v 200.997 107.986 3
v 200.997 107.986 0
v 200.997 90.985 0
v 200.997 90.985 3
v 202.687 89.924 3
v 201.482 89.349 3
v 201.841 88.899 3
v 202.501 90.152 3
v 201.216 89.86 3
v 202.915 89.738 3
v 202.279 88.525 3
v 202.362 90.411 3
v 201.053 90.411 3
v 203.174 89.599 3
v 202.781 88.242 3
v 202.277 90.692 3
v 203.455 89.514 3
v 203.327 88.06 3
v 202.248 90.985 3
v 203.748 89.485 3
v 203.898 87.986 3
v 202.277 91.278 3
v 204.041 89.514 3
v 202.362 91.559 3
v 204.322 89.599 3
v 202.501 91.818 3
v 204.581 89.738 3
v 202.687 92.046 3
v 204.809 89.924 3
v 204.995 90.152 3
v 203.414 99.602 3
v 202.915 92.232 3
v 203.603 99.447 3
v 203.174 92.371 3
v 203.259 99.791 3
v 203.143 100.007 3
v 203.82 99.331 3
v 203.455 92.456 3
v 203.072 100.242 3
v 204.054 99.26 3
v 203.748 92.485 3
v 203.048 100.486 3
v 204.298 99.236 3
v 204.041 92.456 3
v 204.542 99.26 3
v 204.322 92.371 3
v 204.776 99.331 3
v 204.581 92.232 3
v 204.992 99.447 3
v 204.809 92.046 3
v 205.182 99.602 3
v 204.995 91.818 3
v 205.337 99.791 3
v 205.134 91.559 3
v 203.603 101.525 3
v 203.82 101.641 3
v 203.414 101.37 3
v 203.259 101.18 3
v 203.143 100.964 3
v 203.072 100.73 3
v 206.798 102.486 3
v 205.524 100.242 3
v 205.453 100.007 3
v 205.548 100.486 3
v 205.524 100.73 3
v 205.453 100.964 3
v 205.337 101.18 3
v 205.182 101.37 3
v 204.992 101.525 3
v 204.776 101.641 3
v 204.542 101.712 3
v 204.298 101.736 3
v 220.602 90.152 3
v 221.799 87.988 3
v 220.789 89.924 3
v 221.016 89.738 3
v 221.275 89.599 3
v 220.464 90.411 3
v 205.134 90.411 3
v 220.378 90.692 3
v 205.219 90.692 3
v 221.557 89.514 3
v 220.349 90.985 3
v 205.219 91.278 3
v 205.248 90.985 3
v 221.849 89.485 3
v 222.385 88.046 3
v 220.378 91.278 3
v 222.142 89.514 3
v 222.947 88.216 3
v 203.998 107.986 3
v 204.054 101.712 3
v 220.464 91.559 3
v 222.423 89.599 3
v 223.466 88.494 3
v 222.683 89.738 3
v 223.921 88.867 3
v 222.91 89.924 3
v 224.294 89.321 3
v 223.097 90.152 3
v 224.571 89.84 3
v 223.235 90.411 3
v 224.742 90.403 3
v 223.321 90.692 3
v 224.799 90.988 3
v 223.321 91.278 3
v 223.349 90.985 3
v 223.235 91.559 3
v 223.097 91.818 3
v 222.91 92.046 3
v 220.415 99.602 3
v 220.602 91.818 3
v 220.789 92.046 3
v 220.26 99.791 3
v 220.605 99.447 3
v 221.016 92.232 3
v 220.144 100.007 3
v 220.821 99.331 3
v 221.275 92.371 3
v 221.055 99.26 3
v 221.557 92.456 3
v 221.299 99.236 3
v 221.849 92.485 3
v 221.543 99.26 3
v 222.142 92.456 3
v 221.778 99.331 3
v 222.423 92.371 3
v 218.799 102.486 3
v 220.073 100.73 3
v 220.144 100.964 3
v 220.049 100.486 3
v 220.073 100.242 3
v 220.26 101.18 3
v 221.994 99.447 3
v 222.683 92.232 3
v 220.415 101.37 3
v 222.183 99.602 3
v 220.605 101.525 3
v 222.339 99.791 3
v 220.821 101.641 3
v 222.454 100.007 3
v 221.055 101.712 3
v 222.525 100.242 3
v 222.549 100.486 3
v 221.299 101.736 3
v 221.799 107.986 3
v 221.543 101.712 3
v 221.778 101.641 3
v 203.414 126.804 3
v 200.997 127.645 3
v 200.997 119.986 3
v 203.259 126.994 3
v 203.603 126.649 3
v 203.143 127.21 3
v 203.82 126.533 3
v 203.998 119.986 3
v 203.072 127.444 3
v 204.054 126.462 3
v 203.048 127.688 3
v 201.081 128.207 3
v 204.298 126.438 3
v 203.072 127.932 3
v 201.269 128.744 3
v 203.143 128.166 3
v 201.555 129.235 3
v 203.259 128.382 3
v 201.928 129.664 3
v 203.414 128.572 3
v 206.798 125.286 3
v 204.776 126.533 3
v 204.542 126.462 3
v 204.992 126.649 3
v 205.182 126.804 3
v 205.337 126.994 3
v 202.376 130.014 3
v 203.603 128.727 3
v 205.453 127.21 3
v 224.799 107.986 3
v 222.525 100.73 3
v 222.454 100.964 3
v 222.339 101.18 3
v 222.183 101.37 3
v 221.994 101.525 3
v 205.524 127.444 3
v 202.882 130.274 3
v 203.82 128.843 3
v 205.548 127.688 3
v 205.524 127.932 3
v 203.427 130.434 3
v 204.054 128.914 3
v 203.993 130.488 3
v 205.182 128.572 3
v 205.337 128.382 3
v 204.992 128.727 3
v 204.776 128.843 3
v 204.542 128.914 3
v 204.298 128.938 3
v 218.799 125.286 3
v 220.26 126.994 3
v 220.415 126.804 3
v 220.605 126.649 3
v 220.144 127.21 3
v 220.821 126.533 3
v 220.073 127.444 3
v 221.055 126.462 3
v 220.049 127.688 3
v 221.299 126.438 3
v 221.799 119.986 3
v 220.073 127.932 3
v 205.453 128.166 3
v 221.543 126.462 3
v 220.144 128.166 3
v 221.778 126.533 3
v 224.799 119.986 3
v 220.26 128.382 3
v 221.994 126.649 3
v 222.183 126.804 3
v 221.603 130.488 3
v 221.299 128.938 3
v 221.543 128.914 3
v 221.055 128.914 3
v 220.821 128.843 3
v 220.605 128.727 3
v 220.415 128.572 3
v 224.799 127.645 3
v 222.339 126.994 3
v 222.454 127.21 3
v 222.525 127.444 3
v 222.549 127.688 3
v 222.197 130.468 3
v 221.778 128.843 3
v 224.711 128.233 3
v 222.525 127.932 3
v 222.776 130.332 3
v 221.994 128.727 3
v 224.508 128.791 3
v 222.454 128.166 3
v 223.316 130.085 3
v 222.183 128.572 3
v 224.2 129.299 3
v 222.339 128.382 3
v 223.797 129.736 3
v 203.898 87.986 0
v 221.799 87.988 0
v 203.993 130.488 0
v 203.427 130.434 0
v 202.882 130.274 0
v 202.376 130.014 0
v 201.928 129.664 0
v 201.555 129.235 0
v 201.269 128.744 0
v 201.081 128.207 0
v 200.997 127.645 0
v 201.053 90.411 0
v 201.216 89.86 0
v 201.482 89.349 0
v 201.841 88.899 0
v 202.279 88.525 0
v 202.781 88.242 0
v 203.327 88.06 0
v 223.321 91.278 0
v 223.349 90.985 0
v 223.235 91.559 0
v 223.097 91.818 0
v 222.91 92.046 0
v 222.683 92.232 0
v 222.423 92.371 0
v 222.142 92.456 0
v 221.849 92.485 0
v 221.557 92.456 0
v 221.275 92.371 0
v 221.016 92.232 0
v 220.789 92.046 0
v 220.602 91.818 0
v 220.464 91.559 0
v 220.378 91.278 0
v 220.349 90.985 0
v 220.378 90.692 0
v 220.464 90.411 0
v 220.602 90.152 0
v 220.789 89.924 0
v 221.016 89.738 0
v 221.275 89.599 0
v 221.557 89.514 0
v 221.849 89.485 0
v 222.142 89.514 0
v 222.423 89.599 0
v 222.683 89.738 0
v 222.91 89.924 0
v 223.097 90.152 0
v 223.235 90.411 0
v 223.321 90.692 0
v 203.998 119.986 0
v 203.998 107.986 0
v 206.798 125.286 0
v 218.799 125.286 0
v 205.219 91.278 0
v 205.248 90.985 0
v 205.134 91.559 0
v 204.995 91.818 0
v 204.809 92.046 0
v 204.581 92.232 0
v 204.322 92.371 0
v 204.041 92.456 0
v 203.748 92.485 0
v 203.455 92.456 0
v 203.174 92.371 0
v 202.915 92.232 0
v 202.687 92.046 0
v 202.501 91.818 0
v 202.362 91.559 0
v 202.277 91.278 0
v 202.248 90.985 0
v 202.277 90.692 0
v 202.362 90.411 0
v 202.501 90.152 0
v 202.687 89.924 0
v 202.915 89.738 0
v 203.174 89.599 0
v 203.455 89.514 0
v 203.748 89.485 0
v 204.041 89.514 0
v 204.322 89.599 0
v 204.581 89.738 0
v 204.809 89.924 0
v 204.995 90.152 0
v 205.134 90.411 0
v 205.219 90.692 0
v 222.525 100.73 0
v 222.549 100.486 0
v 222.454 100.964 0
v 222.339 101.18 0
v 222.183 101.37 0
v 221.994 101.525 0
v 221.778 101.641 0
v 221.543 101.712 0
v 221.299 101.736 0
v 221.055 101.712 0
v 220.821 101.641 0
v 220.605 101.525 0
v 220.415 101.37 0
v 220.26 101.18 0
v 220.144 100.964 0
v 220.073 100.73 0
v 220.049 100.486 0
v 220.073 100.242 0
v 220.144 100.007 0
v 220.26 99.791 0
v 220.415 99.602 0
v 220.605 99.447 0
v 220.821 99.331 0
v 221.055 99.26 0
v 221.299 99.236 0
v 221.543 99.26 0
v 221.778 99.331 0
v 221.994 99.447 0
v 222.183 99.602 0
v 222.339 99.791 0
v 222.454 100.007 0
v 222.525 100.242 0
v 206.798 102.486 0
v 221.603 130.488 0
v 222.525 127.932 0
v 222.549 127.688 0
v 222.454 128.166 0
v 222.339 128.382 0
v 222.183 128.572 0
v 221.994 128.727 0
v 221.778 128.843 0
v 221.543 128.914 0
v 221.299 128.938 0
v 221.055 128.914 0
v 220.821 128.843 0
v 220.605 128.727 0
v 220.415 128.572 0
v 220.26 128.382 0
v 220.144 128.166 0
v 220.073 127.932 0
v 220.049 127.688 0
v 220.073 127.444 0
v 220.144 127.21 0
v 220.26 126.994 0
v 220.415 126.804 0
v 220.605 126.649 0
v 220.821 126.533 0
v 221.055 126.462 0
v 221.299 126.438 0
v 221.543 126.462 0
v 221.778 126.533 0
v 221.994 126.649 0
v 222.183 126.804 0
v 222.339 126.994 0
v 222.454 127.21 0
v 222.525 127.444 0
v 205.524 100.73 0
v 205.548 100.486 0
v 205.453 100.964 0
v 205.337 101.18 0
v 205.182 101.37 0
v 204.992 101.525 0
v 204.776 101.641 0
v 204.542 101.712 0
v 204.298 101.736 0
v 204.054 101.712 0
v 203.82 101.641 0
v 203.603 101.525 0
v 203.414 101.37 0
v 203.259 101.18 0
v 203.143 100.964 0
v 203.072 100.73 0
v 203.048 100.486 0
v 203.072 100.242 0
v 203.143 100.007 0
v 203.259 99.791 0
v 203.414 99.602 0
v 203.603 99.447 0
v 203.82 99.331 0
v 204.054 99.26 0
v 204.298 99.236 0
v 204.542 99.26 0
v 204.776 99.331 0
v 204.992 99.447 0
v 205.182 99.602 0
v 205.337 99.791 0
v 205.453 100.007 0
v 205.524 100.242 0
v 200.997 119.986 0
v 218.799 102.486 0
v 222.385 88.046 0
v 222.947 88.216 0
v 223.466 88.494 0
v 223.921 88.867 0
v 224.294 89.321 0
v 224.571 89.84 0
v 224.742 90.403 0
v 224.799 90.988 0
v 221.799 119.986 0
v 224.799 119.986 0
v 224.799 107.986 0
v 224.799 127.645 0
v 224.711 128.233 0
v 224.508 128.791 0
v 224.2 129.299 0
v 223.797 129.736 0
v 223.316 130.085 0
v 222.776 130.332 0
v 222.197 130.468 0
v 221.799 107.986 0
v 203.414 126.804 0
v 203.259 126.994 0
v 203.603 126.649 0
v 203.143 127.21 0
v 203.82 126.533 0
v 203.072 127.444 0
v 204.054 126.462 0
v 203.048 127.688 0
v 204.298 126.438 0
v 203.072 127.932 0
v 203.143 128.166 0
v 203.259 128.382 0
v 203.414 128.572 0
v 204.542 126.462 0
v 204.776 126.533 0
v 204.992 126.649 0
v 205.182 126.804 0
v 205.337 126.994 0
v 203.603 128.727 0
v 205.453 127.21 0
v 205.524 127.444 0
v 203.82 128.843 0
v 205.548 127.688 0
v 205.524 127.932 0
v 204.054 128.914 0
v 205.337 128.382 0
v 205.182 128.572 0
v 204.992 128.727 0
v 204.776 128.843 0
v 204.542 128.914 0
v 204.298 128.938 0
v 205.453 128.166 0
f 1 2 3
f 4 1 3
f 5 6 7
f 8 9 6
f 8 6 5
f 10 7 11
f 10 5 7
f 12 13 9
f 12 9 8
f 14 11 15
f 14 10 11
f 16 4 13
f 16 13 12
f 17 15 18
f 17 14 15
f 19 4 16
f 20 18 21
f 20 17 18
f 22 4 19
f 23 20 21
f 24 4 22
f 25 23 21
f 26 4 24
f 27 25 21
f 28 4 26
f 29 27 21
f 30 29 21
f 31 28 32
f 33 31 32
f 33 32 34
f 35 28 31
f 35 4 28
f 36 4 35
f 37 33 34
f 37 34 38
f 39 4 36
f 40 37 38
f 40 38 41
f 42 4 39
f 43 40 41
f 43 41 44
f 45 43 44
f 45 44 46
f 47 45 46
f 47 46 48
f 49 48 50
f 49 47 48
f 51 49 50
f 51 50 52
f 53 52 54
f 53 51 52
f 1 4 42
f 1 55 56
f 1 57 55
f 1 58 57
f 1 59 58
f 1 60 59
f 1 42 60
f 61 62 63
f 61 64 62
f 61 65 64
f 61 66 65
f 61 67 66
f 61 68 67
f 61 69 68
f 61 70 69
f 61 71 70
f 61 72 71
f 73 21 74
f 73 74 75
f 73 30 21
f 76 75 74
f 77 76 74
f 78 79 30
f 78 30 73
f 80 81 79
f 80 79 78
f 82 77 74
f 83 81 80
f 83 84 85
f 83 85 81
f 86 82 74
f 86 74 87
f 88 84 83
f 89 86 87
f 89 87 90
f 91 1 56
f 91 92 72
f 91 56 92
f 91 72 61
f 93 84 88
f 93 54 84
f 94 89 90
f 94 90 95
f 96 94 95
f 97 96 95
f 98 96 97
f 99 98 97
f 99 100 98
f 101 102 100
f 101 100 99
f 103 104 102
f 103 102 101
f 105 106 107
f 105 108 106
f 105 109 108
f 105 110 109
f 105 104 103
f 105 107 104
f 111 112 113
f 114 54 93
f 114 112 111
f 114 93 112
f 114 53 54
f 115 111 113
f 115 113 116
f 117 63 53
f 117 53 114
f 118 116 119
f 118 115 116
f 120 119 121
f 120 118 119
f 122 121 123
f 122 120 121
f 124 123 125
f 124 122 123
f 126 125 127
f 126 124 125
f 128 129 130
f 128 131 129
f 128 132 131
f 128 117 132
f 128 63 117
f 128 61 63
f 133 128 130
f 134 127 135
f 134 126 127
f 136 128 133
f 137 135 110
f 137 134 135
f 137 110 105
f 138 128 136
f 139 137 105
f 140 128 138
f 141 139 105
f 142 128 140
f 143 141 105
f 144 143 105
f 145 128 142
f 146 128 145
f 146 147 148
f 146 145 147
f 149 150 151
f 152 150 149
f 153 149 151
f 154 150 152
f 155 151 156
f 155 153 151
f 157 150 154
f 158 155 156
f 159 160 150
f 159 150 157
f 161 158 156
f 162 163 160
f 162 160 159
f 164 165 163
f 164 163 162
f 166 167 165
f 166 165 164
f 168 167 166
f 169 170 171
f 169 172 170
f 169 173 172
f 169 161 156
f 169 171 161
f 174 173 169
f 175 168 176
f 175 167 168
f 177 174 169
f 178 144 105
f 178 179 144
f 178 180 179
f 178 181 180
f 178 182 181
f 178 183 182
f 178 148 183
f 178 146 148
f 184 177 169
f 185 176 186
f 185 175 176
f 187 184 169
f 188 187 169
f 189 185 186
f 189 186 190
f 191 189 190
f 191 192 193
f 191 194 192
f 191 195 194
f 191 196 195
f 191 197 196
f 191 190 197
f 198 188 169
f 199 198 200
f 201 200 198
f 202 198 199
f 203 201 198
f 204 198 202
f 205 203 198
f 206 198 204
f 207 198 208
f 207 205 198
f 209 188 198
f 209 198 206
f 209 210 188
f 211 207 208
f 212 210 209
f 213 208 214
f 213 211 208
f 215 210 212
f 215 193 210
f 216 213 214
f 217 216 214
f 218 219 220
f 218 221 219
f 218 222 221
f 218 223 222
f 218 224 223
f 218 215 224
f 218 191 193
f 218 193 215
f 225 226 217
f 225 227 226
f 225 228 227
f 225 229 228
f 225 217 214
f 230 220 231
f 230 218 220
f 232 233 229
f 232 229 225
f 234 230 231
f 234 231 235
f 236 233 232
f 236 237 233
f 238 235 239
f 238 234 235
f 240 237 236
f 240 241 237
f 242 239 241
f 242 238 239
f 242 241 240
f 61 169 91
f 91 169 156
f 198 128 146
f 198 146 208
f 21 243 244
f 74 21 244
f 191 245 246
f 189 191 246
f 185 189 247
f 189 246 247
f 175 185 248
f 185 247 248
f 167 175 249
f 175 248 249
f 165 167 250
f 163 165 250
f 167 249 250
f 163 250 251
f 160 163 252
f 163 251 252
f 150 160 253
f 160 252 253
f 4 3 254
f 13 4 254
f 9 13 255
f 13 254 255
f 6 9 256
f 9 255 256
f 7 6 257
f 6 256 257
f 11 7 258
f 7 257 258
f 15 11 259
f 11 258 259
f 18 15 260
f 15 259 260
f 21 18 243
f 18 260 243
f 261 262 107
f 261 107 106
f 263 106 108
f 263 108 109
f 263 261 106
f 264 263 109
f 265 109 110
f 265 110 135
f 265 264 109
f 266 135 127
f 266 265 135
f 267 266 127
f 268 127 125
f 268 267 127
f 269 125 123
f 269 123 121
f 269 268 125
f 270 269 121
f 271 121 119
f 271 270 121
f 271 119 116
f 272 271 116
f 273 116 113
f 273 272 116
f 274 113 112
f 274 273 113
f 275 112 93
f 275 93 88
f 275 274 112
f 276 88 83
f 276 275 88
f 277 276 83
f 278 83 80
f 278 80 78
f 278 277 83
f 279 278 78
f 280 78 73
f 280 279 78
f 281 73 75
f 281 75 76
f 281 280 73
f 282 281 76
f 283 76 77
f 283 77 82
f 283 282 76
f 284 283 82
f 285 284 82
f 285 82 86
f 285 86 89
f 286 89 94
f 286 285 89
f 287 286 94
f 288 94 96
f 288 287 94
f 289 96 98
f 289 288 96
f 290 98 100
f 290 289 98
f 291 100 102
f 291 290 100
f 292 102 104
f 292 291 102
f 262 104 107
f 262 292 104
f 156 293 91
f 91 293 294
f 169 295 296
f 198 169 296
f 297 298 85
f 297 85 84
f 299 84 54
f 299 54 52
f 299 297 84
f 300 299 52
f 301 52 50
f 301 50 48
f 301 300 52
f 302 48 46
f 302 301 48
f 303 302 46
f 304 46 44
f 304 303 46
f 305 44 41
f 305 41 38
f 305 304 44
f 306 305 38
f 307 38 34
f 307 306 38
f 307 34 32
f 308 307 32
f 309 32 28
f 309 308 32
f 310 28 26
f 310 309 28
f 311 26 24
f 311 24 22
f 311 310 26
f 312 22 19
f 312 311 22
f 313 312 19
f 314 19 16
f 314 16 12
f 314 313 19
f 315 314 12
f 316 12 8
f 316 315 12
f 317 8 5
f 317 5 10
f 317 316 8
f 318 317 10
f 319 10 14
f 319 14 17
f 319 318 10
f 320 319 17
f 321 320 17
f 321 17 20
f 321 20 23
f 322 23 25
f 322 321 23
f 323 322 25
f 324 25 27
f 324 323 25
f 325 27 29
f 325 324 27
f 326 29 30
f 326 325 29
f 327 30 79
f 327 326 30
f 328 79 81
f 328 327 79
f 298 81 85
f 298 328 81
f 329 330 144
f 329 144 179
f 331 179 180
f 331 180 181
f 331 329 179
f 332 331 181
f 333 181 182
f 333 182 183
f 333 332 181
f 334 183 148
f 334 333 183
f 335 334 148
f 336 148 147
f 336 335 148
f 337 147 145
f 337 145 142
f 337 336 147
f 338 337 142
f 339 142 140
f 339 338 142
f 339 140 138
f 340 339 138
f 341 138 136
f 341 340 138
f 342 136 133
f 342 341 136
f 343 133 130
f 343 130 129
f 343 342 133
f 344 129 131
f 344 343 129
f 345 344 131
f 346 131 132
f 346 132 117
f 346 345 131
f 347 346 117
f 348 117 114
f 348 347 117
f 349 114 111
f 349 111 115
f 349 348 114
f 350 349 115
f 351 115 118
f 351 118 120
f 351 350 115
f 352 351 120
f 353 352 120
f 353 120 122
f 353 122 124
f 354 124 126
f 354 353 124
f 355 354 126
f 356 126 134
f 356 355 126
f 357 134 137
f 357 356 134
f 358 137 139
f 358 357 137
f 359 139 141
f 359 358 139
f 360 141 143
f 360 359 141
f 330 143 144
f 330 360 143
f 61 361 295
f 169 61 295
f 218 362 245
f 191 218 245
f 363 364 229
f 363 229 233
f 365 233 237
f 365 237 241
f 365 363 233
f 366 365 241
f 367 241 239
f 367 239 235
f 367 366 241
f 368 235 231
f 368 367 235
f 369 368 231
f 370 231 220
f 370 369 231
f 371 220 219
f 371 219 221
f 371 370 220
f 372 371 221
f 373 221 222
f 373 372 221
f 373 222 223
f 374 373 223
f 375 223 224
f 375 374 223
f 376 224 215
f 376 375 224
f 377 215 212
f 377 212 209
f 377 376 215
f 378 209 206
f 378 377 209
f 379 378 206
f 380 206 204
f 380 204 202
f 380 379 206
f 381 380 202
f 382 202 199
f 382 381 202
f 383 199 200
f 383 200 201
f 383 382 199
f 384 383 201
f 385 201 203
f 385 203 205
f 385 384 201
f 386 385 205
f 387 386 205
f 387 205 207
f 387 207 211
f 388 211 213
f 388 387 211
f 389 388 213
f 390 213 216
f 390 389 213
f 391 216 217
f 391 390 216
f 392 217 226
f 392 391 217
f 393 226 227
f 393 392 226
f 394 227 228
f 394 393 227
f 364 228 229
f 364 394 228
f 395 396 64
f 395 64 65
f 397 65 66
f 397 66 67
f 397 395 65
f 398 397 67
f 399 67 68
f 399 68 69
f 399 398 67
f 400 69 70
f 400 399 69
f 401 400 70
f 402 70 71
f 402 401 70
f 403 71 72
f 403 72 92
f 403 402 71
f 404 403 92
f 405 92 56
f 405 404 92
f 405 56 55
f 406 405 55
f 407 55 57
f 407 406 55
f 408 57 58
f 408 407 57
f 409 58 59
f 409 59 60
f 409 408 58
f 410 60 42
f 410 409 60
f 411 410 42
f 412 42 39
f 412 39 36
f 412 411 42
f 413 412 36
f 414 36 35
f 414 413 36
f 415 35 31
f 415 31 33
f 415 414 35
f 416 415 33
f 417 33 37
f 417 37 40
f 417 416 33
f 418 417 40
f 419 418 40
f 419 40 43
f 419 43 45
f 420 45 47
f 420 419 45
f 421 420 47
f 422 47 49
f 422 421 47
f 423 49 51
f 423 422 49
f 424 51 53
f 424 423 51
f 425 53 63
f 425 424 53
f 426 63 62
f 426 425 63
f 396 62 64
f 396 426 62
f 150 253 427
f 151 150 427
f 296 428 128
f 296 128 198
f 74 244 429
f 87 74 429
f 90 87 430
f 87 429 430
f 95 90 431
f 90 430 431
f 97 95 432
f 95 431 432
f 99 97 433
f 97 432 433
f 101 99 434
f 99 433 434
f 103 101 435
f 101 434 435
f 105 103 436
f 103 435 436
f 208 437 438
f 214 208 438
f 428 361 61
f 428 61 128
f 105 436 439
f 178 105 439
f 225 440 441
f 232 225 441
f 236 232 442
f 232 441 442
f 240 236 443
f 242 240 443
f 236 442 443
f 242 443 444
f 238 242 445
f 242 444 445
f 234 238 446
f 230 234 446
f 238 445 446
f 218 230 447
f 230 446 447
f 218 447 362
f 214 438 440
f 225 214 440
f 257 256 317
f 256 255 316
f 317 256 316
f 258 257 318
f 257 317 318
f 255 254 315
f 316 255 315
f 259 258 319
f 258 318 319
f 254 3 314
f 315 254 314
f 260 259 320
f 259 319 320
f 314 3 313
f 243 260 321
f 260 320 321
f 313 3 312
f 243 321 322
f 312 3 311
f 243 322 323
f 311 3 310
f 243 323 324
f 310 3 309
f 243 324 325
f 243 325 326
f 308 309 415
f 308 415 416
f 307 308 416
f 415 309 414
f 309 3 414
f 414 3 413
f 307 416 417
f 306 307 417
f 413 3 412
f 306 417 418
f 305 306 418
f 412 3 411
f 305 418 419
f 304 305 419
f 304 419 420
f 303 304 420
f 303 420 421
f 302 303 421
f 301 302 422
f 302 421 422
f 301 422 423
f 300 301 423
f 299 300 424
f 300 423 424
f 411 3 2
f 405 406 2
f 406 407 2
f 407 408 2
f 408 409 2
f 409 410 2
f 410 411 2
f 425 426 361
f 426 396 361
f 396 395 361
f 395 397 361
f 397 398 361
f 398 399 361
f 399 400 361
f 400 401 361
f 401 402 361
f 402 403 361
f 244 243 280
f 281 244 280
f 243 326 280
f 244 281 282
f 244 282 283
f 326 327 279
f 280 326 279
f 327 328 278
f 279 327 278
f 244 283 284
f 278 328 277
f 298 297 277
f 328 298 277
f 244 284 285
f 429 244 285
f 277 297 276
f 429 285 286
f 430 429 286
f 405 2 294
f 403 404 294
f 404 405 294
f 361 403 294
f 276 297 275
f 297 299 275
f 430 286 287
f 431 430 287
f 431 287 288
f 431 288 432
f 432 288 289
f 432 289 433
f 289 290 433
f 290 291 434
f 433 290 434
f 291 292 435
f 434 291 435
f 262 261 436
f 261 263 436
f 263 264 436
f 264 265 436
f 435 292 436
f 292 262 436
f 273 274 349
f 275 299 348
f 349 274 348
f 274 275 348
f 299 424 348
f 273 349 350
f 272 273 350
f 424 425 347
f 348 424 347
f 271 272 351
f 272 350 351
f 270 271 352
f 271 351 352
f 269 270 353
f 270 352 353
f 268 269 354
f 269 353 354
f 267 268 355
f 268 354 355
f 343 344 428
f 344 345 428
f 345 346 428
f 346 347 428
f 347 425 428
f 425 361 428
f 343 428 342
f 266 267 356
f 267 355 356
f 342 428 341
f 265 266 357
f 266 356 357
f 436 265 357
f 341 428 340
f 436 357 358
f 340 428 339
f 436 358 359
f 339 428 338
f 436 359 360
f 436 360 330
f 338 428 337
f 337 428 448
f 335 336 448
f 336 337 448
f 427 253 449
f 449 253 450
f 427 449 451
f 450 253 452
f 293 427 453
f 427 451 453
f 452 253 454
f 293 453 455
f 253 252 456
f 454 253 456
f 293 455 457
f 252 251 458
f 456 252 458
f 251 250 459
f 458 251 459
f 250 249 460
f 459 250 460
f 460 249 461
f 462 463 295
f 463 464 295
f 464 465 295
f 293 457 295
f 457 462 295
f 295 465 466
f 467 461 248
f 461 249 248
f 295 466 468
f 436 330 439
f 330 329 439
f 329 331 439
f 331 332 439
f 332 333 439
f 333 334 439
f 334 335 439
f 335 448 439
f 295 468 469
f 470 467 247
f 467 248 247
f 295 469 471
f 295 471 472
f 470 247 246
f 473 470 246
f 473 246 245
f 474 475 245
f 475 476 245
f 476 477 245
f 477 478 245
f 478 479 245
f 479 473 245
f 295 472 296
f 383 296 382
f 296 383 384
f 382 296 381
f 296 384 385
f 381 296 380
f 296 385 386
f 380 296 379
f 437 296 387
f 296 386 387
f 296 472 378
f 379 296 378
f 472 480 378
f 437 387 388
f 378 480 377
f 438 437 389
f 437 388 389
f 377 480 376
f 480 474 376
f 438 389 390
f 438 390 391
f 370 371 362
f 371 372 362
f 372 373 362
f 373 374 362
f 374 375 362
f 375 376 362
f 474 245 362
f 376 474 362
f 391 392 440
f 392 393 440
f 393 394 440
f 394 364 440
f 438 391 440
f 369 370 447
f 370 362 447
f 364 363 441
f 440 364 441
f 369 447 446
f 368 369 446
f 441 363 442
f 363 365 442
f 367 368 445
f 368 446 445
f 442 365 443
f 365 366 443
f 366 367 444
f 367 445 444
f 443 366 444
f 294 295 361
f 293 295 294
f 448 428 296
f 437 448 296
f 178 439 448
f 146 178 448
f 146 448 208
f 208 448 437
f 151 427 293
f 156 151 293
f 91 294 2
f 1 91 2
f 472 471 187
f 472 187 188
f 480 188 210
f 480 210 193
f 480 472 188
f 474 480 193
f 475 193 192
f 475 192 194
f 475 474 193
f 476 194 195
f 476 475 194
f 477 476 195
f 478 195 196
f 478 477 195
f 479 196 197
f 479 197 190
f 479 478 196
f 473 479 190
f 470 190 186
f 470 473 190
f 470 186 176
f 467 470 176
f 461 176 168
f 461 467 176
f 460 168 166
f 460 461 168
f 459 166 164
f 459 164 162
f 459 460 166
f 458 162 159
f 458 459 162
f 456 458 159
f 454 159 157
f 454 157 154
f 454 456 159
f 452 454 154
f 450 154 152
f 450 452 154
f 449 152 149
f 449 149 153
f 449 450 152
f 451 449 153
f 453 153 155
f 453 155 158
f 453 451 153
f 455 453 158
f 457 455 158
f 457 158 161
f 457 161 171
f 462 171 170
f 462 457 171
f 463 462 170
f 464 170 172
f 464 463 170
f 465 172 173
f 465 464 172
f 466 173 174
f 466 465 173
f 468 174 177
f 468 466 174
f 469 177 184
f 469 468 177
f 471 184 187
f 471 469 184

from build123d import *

# Parameters (mm, degrees)
SKETCH_1_R      = 1.25
SKETCH_1_R_2    = 1.5
SKETCH_1_W      = 12.000960833
SKETCH_1_H      = 22.8
EXTRUDE_1_DEPTH = 3


with BuildPart() as part:
    # 草圖1 → 填料-伸長1 (new body)
    with BuildSketch(Plane.XY):
        with BuildLine():
            Line((224.799401664, 107.985882496), (221.799401664, 107.985882496))
            Line((221.799401664, 107.985882496), (221.799401664, 119.985882496))
            Line((221.799401664, 119.985882496), (224.799369028, 119.985882496))
            Line((224.799369028, 119.985882496), (224.799401664, 127.645063489))
            ThreePointArc((224.799401664, 127.645063489), (223.796832359, 129.736024952), (221.603142855, 130.487684059))
            Line((221.603142855, 130.487684059), (203.993498606, 130.487684059))
            ThreePointArc((203.993498606, 130.487684059), (201.928341095, 129.663767205), (200.997480004, 127.64455643))
            Line((200.997480004, 127.64455643), (200.997480004, 119.985882496))
            Line((200.997480004, 119.985882496), (203.997720212, 119.985882496))
            Line((203.997720212, 119.985882496), (203.997720212, 107.985882496))
            Line((203.997720212, 107.985882496), (200.997480004, 107.985882496))
            Line((200.997480004, 107.985882496), (200.997480004, 90.984521316))
            ThreePointArc((200.997480004, 90.984521316), (201.841197388, 88.898693406), (203.897756422, 87.985949173))
            Line((203.897756422, 87.985949173), (221.799361625, 87.987966928))
            ThreePointArc((221.799361625, 87.987966928), (223.920611625, 88.866716927), (224.799361625, 90.987966928))
            Line((224.799361625, 90.987966928), (224.799401664, 107.985882496))
        make_face()
        with Locations((204.297950444, 127.688016928)):
            Circle(SKETCH_1_R, mode=Mode.SUBTRACT)
        with Locations((221.299311625, 127.688016928)):
            Circle(SKETCH_1_R, mode=Mode.SUBTRACT)
        with Locations((221.299311625, 100.485839038)):
            Circle(SKETCH_1_R, mode=Mode.SUBTRACT)
        with Locations((221.849455668, 90.985078375)):
            Circle(SKETCH_1_R_2, mode=Mode.SUBTRACT)
        with Locations((203.748006411, 90.985078375)):
            Circle(SKETCH_1_R_2, mode=Mode.SUBTRACT)
        with Locations((204.297950444, 100.485839038)):
            Circle(SKETCH_1_R, mode=Mode.SUBTRACT)
        with Locations((212.79832073, 113.885949173)):
            Rectangle(SKETCH_1_W, SKETCH_1_H, mode=Mode.SUBTRACT)
    extrude(amount=EXTRUDE_1_DEPTH)


solid = part.part
